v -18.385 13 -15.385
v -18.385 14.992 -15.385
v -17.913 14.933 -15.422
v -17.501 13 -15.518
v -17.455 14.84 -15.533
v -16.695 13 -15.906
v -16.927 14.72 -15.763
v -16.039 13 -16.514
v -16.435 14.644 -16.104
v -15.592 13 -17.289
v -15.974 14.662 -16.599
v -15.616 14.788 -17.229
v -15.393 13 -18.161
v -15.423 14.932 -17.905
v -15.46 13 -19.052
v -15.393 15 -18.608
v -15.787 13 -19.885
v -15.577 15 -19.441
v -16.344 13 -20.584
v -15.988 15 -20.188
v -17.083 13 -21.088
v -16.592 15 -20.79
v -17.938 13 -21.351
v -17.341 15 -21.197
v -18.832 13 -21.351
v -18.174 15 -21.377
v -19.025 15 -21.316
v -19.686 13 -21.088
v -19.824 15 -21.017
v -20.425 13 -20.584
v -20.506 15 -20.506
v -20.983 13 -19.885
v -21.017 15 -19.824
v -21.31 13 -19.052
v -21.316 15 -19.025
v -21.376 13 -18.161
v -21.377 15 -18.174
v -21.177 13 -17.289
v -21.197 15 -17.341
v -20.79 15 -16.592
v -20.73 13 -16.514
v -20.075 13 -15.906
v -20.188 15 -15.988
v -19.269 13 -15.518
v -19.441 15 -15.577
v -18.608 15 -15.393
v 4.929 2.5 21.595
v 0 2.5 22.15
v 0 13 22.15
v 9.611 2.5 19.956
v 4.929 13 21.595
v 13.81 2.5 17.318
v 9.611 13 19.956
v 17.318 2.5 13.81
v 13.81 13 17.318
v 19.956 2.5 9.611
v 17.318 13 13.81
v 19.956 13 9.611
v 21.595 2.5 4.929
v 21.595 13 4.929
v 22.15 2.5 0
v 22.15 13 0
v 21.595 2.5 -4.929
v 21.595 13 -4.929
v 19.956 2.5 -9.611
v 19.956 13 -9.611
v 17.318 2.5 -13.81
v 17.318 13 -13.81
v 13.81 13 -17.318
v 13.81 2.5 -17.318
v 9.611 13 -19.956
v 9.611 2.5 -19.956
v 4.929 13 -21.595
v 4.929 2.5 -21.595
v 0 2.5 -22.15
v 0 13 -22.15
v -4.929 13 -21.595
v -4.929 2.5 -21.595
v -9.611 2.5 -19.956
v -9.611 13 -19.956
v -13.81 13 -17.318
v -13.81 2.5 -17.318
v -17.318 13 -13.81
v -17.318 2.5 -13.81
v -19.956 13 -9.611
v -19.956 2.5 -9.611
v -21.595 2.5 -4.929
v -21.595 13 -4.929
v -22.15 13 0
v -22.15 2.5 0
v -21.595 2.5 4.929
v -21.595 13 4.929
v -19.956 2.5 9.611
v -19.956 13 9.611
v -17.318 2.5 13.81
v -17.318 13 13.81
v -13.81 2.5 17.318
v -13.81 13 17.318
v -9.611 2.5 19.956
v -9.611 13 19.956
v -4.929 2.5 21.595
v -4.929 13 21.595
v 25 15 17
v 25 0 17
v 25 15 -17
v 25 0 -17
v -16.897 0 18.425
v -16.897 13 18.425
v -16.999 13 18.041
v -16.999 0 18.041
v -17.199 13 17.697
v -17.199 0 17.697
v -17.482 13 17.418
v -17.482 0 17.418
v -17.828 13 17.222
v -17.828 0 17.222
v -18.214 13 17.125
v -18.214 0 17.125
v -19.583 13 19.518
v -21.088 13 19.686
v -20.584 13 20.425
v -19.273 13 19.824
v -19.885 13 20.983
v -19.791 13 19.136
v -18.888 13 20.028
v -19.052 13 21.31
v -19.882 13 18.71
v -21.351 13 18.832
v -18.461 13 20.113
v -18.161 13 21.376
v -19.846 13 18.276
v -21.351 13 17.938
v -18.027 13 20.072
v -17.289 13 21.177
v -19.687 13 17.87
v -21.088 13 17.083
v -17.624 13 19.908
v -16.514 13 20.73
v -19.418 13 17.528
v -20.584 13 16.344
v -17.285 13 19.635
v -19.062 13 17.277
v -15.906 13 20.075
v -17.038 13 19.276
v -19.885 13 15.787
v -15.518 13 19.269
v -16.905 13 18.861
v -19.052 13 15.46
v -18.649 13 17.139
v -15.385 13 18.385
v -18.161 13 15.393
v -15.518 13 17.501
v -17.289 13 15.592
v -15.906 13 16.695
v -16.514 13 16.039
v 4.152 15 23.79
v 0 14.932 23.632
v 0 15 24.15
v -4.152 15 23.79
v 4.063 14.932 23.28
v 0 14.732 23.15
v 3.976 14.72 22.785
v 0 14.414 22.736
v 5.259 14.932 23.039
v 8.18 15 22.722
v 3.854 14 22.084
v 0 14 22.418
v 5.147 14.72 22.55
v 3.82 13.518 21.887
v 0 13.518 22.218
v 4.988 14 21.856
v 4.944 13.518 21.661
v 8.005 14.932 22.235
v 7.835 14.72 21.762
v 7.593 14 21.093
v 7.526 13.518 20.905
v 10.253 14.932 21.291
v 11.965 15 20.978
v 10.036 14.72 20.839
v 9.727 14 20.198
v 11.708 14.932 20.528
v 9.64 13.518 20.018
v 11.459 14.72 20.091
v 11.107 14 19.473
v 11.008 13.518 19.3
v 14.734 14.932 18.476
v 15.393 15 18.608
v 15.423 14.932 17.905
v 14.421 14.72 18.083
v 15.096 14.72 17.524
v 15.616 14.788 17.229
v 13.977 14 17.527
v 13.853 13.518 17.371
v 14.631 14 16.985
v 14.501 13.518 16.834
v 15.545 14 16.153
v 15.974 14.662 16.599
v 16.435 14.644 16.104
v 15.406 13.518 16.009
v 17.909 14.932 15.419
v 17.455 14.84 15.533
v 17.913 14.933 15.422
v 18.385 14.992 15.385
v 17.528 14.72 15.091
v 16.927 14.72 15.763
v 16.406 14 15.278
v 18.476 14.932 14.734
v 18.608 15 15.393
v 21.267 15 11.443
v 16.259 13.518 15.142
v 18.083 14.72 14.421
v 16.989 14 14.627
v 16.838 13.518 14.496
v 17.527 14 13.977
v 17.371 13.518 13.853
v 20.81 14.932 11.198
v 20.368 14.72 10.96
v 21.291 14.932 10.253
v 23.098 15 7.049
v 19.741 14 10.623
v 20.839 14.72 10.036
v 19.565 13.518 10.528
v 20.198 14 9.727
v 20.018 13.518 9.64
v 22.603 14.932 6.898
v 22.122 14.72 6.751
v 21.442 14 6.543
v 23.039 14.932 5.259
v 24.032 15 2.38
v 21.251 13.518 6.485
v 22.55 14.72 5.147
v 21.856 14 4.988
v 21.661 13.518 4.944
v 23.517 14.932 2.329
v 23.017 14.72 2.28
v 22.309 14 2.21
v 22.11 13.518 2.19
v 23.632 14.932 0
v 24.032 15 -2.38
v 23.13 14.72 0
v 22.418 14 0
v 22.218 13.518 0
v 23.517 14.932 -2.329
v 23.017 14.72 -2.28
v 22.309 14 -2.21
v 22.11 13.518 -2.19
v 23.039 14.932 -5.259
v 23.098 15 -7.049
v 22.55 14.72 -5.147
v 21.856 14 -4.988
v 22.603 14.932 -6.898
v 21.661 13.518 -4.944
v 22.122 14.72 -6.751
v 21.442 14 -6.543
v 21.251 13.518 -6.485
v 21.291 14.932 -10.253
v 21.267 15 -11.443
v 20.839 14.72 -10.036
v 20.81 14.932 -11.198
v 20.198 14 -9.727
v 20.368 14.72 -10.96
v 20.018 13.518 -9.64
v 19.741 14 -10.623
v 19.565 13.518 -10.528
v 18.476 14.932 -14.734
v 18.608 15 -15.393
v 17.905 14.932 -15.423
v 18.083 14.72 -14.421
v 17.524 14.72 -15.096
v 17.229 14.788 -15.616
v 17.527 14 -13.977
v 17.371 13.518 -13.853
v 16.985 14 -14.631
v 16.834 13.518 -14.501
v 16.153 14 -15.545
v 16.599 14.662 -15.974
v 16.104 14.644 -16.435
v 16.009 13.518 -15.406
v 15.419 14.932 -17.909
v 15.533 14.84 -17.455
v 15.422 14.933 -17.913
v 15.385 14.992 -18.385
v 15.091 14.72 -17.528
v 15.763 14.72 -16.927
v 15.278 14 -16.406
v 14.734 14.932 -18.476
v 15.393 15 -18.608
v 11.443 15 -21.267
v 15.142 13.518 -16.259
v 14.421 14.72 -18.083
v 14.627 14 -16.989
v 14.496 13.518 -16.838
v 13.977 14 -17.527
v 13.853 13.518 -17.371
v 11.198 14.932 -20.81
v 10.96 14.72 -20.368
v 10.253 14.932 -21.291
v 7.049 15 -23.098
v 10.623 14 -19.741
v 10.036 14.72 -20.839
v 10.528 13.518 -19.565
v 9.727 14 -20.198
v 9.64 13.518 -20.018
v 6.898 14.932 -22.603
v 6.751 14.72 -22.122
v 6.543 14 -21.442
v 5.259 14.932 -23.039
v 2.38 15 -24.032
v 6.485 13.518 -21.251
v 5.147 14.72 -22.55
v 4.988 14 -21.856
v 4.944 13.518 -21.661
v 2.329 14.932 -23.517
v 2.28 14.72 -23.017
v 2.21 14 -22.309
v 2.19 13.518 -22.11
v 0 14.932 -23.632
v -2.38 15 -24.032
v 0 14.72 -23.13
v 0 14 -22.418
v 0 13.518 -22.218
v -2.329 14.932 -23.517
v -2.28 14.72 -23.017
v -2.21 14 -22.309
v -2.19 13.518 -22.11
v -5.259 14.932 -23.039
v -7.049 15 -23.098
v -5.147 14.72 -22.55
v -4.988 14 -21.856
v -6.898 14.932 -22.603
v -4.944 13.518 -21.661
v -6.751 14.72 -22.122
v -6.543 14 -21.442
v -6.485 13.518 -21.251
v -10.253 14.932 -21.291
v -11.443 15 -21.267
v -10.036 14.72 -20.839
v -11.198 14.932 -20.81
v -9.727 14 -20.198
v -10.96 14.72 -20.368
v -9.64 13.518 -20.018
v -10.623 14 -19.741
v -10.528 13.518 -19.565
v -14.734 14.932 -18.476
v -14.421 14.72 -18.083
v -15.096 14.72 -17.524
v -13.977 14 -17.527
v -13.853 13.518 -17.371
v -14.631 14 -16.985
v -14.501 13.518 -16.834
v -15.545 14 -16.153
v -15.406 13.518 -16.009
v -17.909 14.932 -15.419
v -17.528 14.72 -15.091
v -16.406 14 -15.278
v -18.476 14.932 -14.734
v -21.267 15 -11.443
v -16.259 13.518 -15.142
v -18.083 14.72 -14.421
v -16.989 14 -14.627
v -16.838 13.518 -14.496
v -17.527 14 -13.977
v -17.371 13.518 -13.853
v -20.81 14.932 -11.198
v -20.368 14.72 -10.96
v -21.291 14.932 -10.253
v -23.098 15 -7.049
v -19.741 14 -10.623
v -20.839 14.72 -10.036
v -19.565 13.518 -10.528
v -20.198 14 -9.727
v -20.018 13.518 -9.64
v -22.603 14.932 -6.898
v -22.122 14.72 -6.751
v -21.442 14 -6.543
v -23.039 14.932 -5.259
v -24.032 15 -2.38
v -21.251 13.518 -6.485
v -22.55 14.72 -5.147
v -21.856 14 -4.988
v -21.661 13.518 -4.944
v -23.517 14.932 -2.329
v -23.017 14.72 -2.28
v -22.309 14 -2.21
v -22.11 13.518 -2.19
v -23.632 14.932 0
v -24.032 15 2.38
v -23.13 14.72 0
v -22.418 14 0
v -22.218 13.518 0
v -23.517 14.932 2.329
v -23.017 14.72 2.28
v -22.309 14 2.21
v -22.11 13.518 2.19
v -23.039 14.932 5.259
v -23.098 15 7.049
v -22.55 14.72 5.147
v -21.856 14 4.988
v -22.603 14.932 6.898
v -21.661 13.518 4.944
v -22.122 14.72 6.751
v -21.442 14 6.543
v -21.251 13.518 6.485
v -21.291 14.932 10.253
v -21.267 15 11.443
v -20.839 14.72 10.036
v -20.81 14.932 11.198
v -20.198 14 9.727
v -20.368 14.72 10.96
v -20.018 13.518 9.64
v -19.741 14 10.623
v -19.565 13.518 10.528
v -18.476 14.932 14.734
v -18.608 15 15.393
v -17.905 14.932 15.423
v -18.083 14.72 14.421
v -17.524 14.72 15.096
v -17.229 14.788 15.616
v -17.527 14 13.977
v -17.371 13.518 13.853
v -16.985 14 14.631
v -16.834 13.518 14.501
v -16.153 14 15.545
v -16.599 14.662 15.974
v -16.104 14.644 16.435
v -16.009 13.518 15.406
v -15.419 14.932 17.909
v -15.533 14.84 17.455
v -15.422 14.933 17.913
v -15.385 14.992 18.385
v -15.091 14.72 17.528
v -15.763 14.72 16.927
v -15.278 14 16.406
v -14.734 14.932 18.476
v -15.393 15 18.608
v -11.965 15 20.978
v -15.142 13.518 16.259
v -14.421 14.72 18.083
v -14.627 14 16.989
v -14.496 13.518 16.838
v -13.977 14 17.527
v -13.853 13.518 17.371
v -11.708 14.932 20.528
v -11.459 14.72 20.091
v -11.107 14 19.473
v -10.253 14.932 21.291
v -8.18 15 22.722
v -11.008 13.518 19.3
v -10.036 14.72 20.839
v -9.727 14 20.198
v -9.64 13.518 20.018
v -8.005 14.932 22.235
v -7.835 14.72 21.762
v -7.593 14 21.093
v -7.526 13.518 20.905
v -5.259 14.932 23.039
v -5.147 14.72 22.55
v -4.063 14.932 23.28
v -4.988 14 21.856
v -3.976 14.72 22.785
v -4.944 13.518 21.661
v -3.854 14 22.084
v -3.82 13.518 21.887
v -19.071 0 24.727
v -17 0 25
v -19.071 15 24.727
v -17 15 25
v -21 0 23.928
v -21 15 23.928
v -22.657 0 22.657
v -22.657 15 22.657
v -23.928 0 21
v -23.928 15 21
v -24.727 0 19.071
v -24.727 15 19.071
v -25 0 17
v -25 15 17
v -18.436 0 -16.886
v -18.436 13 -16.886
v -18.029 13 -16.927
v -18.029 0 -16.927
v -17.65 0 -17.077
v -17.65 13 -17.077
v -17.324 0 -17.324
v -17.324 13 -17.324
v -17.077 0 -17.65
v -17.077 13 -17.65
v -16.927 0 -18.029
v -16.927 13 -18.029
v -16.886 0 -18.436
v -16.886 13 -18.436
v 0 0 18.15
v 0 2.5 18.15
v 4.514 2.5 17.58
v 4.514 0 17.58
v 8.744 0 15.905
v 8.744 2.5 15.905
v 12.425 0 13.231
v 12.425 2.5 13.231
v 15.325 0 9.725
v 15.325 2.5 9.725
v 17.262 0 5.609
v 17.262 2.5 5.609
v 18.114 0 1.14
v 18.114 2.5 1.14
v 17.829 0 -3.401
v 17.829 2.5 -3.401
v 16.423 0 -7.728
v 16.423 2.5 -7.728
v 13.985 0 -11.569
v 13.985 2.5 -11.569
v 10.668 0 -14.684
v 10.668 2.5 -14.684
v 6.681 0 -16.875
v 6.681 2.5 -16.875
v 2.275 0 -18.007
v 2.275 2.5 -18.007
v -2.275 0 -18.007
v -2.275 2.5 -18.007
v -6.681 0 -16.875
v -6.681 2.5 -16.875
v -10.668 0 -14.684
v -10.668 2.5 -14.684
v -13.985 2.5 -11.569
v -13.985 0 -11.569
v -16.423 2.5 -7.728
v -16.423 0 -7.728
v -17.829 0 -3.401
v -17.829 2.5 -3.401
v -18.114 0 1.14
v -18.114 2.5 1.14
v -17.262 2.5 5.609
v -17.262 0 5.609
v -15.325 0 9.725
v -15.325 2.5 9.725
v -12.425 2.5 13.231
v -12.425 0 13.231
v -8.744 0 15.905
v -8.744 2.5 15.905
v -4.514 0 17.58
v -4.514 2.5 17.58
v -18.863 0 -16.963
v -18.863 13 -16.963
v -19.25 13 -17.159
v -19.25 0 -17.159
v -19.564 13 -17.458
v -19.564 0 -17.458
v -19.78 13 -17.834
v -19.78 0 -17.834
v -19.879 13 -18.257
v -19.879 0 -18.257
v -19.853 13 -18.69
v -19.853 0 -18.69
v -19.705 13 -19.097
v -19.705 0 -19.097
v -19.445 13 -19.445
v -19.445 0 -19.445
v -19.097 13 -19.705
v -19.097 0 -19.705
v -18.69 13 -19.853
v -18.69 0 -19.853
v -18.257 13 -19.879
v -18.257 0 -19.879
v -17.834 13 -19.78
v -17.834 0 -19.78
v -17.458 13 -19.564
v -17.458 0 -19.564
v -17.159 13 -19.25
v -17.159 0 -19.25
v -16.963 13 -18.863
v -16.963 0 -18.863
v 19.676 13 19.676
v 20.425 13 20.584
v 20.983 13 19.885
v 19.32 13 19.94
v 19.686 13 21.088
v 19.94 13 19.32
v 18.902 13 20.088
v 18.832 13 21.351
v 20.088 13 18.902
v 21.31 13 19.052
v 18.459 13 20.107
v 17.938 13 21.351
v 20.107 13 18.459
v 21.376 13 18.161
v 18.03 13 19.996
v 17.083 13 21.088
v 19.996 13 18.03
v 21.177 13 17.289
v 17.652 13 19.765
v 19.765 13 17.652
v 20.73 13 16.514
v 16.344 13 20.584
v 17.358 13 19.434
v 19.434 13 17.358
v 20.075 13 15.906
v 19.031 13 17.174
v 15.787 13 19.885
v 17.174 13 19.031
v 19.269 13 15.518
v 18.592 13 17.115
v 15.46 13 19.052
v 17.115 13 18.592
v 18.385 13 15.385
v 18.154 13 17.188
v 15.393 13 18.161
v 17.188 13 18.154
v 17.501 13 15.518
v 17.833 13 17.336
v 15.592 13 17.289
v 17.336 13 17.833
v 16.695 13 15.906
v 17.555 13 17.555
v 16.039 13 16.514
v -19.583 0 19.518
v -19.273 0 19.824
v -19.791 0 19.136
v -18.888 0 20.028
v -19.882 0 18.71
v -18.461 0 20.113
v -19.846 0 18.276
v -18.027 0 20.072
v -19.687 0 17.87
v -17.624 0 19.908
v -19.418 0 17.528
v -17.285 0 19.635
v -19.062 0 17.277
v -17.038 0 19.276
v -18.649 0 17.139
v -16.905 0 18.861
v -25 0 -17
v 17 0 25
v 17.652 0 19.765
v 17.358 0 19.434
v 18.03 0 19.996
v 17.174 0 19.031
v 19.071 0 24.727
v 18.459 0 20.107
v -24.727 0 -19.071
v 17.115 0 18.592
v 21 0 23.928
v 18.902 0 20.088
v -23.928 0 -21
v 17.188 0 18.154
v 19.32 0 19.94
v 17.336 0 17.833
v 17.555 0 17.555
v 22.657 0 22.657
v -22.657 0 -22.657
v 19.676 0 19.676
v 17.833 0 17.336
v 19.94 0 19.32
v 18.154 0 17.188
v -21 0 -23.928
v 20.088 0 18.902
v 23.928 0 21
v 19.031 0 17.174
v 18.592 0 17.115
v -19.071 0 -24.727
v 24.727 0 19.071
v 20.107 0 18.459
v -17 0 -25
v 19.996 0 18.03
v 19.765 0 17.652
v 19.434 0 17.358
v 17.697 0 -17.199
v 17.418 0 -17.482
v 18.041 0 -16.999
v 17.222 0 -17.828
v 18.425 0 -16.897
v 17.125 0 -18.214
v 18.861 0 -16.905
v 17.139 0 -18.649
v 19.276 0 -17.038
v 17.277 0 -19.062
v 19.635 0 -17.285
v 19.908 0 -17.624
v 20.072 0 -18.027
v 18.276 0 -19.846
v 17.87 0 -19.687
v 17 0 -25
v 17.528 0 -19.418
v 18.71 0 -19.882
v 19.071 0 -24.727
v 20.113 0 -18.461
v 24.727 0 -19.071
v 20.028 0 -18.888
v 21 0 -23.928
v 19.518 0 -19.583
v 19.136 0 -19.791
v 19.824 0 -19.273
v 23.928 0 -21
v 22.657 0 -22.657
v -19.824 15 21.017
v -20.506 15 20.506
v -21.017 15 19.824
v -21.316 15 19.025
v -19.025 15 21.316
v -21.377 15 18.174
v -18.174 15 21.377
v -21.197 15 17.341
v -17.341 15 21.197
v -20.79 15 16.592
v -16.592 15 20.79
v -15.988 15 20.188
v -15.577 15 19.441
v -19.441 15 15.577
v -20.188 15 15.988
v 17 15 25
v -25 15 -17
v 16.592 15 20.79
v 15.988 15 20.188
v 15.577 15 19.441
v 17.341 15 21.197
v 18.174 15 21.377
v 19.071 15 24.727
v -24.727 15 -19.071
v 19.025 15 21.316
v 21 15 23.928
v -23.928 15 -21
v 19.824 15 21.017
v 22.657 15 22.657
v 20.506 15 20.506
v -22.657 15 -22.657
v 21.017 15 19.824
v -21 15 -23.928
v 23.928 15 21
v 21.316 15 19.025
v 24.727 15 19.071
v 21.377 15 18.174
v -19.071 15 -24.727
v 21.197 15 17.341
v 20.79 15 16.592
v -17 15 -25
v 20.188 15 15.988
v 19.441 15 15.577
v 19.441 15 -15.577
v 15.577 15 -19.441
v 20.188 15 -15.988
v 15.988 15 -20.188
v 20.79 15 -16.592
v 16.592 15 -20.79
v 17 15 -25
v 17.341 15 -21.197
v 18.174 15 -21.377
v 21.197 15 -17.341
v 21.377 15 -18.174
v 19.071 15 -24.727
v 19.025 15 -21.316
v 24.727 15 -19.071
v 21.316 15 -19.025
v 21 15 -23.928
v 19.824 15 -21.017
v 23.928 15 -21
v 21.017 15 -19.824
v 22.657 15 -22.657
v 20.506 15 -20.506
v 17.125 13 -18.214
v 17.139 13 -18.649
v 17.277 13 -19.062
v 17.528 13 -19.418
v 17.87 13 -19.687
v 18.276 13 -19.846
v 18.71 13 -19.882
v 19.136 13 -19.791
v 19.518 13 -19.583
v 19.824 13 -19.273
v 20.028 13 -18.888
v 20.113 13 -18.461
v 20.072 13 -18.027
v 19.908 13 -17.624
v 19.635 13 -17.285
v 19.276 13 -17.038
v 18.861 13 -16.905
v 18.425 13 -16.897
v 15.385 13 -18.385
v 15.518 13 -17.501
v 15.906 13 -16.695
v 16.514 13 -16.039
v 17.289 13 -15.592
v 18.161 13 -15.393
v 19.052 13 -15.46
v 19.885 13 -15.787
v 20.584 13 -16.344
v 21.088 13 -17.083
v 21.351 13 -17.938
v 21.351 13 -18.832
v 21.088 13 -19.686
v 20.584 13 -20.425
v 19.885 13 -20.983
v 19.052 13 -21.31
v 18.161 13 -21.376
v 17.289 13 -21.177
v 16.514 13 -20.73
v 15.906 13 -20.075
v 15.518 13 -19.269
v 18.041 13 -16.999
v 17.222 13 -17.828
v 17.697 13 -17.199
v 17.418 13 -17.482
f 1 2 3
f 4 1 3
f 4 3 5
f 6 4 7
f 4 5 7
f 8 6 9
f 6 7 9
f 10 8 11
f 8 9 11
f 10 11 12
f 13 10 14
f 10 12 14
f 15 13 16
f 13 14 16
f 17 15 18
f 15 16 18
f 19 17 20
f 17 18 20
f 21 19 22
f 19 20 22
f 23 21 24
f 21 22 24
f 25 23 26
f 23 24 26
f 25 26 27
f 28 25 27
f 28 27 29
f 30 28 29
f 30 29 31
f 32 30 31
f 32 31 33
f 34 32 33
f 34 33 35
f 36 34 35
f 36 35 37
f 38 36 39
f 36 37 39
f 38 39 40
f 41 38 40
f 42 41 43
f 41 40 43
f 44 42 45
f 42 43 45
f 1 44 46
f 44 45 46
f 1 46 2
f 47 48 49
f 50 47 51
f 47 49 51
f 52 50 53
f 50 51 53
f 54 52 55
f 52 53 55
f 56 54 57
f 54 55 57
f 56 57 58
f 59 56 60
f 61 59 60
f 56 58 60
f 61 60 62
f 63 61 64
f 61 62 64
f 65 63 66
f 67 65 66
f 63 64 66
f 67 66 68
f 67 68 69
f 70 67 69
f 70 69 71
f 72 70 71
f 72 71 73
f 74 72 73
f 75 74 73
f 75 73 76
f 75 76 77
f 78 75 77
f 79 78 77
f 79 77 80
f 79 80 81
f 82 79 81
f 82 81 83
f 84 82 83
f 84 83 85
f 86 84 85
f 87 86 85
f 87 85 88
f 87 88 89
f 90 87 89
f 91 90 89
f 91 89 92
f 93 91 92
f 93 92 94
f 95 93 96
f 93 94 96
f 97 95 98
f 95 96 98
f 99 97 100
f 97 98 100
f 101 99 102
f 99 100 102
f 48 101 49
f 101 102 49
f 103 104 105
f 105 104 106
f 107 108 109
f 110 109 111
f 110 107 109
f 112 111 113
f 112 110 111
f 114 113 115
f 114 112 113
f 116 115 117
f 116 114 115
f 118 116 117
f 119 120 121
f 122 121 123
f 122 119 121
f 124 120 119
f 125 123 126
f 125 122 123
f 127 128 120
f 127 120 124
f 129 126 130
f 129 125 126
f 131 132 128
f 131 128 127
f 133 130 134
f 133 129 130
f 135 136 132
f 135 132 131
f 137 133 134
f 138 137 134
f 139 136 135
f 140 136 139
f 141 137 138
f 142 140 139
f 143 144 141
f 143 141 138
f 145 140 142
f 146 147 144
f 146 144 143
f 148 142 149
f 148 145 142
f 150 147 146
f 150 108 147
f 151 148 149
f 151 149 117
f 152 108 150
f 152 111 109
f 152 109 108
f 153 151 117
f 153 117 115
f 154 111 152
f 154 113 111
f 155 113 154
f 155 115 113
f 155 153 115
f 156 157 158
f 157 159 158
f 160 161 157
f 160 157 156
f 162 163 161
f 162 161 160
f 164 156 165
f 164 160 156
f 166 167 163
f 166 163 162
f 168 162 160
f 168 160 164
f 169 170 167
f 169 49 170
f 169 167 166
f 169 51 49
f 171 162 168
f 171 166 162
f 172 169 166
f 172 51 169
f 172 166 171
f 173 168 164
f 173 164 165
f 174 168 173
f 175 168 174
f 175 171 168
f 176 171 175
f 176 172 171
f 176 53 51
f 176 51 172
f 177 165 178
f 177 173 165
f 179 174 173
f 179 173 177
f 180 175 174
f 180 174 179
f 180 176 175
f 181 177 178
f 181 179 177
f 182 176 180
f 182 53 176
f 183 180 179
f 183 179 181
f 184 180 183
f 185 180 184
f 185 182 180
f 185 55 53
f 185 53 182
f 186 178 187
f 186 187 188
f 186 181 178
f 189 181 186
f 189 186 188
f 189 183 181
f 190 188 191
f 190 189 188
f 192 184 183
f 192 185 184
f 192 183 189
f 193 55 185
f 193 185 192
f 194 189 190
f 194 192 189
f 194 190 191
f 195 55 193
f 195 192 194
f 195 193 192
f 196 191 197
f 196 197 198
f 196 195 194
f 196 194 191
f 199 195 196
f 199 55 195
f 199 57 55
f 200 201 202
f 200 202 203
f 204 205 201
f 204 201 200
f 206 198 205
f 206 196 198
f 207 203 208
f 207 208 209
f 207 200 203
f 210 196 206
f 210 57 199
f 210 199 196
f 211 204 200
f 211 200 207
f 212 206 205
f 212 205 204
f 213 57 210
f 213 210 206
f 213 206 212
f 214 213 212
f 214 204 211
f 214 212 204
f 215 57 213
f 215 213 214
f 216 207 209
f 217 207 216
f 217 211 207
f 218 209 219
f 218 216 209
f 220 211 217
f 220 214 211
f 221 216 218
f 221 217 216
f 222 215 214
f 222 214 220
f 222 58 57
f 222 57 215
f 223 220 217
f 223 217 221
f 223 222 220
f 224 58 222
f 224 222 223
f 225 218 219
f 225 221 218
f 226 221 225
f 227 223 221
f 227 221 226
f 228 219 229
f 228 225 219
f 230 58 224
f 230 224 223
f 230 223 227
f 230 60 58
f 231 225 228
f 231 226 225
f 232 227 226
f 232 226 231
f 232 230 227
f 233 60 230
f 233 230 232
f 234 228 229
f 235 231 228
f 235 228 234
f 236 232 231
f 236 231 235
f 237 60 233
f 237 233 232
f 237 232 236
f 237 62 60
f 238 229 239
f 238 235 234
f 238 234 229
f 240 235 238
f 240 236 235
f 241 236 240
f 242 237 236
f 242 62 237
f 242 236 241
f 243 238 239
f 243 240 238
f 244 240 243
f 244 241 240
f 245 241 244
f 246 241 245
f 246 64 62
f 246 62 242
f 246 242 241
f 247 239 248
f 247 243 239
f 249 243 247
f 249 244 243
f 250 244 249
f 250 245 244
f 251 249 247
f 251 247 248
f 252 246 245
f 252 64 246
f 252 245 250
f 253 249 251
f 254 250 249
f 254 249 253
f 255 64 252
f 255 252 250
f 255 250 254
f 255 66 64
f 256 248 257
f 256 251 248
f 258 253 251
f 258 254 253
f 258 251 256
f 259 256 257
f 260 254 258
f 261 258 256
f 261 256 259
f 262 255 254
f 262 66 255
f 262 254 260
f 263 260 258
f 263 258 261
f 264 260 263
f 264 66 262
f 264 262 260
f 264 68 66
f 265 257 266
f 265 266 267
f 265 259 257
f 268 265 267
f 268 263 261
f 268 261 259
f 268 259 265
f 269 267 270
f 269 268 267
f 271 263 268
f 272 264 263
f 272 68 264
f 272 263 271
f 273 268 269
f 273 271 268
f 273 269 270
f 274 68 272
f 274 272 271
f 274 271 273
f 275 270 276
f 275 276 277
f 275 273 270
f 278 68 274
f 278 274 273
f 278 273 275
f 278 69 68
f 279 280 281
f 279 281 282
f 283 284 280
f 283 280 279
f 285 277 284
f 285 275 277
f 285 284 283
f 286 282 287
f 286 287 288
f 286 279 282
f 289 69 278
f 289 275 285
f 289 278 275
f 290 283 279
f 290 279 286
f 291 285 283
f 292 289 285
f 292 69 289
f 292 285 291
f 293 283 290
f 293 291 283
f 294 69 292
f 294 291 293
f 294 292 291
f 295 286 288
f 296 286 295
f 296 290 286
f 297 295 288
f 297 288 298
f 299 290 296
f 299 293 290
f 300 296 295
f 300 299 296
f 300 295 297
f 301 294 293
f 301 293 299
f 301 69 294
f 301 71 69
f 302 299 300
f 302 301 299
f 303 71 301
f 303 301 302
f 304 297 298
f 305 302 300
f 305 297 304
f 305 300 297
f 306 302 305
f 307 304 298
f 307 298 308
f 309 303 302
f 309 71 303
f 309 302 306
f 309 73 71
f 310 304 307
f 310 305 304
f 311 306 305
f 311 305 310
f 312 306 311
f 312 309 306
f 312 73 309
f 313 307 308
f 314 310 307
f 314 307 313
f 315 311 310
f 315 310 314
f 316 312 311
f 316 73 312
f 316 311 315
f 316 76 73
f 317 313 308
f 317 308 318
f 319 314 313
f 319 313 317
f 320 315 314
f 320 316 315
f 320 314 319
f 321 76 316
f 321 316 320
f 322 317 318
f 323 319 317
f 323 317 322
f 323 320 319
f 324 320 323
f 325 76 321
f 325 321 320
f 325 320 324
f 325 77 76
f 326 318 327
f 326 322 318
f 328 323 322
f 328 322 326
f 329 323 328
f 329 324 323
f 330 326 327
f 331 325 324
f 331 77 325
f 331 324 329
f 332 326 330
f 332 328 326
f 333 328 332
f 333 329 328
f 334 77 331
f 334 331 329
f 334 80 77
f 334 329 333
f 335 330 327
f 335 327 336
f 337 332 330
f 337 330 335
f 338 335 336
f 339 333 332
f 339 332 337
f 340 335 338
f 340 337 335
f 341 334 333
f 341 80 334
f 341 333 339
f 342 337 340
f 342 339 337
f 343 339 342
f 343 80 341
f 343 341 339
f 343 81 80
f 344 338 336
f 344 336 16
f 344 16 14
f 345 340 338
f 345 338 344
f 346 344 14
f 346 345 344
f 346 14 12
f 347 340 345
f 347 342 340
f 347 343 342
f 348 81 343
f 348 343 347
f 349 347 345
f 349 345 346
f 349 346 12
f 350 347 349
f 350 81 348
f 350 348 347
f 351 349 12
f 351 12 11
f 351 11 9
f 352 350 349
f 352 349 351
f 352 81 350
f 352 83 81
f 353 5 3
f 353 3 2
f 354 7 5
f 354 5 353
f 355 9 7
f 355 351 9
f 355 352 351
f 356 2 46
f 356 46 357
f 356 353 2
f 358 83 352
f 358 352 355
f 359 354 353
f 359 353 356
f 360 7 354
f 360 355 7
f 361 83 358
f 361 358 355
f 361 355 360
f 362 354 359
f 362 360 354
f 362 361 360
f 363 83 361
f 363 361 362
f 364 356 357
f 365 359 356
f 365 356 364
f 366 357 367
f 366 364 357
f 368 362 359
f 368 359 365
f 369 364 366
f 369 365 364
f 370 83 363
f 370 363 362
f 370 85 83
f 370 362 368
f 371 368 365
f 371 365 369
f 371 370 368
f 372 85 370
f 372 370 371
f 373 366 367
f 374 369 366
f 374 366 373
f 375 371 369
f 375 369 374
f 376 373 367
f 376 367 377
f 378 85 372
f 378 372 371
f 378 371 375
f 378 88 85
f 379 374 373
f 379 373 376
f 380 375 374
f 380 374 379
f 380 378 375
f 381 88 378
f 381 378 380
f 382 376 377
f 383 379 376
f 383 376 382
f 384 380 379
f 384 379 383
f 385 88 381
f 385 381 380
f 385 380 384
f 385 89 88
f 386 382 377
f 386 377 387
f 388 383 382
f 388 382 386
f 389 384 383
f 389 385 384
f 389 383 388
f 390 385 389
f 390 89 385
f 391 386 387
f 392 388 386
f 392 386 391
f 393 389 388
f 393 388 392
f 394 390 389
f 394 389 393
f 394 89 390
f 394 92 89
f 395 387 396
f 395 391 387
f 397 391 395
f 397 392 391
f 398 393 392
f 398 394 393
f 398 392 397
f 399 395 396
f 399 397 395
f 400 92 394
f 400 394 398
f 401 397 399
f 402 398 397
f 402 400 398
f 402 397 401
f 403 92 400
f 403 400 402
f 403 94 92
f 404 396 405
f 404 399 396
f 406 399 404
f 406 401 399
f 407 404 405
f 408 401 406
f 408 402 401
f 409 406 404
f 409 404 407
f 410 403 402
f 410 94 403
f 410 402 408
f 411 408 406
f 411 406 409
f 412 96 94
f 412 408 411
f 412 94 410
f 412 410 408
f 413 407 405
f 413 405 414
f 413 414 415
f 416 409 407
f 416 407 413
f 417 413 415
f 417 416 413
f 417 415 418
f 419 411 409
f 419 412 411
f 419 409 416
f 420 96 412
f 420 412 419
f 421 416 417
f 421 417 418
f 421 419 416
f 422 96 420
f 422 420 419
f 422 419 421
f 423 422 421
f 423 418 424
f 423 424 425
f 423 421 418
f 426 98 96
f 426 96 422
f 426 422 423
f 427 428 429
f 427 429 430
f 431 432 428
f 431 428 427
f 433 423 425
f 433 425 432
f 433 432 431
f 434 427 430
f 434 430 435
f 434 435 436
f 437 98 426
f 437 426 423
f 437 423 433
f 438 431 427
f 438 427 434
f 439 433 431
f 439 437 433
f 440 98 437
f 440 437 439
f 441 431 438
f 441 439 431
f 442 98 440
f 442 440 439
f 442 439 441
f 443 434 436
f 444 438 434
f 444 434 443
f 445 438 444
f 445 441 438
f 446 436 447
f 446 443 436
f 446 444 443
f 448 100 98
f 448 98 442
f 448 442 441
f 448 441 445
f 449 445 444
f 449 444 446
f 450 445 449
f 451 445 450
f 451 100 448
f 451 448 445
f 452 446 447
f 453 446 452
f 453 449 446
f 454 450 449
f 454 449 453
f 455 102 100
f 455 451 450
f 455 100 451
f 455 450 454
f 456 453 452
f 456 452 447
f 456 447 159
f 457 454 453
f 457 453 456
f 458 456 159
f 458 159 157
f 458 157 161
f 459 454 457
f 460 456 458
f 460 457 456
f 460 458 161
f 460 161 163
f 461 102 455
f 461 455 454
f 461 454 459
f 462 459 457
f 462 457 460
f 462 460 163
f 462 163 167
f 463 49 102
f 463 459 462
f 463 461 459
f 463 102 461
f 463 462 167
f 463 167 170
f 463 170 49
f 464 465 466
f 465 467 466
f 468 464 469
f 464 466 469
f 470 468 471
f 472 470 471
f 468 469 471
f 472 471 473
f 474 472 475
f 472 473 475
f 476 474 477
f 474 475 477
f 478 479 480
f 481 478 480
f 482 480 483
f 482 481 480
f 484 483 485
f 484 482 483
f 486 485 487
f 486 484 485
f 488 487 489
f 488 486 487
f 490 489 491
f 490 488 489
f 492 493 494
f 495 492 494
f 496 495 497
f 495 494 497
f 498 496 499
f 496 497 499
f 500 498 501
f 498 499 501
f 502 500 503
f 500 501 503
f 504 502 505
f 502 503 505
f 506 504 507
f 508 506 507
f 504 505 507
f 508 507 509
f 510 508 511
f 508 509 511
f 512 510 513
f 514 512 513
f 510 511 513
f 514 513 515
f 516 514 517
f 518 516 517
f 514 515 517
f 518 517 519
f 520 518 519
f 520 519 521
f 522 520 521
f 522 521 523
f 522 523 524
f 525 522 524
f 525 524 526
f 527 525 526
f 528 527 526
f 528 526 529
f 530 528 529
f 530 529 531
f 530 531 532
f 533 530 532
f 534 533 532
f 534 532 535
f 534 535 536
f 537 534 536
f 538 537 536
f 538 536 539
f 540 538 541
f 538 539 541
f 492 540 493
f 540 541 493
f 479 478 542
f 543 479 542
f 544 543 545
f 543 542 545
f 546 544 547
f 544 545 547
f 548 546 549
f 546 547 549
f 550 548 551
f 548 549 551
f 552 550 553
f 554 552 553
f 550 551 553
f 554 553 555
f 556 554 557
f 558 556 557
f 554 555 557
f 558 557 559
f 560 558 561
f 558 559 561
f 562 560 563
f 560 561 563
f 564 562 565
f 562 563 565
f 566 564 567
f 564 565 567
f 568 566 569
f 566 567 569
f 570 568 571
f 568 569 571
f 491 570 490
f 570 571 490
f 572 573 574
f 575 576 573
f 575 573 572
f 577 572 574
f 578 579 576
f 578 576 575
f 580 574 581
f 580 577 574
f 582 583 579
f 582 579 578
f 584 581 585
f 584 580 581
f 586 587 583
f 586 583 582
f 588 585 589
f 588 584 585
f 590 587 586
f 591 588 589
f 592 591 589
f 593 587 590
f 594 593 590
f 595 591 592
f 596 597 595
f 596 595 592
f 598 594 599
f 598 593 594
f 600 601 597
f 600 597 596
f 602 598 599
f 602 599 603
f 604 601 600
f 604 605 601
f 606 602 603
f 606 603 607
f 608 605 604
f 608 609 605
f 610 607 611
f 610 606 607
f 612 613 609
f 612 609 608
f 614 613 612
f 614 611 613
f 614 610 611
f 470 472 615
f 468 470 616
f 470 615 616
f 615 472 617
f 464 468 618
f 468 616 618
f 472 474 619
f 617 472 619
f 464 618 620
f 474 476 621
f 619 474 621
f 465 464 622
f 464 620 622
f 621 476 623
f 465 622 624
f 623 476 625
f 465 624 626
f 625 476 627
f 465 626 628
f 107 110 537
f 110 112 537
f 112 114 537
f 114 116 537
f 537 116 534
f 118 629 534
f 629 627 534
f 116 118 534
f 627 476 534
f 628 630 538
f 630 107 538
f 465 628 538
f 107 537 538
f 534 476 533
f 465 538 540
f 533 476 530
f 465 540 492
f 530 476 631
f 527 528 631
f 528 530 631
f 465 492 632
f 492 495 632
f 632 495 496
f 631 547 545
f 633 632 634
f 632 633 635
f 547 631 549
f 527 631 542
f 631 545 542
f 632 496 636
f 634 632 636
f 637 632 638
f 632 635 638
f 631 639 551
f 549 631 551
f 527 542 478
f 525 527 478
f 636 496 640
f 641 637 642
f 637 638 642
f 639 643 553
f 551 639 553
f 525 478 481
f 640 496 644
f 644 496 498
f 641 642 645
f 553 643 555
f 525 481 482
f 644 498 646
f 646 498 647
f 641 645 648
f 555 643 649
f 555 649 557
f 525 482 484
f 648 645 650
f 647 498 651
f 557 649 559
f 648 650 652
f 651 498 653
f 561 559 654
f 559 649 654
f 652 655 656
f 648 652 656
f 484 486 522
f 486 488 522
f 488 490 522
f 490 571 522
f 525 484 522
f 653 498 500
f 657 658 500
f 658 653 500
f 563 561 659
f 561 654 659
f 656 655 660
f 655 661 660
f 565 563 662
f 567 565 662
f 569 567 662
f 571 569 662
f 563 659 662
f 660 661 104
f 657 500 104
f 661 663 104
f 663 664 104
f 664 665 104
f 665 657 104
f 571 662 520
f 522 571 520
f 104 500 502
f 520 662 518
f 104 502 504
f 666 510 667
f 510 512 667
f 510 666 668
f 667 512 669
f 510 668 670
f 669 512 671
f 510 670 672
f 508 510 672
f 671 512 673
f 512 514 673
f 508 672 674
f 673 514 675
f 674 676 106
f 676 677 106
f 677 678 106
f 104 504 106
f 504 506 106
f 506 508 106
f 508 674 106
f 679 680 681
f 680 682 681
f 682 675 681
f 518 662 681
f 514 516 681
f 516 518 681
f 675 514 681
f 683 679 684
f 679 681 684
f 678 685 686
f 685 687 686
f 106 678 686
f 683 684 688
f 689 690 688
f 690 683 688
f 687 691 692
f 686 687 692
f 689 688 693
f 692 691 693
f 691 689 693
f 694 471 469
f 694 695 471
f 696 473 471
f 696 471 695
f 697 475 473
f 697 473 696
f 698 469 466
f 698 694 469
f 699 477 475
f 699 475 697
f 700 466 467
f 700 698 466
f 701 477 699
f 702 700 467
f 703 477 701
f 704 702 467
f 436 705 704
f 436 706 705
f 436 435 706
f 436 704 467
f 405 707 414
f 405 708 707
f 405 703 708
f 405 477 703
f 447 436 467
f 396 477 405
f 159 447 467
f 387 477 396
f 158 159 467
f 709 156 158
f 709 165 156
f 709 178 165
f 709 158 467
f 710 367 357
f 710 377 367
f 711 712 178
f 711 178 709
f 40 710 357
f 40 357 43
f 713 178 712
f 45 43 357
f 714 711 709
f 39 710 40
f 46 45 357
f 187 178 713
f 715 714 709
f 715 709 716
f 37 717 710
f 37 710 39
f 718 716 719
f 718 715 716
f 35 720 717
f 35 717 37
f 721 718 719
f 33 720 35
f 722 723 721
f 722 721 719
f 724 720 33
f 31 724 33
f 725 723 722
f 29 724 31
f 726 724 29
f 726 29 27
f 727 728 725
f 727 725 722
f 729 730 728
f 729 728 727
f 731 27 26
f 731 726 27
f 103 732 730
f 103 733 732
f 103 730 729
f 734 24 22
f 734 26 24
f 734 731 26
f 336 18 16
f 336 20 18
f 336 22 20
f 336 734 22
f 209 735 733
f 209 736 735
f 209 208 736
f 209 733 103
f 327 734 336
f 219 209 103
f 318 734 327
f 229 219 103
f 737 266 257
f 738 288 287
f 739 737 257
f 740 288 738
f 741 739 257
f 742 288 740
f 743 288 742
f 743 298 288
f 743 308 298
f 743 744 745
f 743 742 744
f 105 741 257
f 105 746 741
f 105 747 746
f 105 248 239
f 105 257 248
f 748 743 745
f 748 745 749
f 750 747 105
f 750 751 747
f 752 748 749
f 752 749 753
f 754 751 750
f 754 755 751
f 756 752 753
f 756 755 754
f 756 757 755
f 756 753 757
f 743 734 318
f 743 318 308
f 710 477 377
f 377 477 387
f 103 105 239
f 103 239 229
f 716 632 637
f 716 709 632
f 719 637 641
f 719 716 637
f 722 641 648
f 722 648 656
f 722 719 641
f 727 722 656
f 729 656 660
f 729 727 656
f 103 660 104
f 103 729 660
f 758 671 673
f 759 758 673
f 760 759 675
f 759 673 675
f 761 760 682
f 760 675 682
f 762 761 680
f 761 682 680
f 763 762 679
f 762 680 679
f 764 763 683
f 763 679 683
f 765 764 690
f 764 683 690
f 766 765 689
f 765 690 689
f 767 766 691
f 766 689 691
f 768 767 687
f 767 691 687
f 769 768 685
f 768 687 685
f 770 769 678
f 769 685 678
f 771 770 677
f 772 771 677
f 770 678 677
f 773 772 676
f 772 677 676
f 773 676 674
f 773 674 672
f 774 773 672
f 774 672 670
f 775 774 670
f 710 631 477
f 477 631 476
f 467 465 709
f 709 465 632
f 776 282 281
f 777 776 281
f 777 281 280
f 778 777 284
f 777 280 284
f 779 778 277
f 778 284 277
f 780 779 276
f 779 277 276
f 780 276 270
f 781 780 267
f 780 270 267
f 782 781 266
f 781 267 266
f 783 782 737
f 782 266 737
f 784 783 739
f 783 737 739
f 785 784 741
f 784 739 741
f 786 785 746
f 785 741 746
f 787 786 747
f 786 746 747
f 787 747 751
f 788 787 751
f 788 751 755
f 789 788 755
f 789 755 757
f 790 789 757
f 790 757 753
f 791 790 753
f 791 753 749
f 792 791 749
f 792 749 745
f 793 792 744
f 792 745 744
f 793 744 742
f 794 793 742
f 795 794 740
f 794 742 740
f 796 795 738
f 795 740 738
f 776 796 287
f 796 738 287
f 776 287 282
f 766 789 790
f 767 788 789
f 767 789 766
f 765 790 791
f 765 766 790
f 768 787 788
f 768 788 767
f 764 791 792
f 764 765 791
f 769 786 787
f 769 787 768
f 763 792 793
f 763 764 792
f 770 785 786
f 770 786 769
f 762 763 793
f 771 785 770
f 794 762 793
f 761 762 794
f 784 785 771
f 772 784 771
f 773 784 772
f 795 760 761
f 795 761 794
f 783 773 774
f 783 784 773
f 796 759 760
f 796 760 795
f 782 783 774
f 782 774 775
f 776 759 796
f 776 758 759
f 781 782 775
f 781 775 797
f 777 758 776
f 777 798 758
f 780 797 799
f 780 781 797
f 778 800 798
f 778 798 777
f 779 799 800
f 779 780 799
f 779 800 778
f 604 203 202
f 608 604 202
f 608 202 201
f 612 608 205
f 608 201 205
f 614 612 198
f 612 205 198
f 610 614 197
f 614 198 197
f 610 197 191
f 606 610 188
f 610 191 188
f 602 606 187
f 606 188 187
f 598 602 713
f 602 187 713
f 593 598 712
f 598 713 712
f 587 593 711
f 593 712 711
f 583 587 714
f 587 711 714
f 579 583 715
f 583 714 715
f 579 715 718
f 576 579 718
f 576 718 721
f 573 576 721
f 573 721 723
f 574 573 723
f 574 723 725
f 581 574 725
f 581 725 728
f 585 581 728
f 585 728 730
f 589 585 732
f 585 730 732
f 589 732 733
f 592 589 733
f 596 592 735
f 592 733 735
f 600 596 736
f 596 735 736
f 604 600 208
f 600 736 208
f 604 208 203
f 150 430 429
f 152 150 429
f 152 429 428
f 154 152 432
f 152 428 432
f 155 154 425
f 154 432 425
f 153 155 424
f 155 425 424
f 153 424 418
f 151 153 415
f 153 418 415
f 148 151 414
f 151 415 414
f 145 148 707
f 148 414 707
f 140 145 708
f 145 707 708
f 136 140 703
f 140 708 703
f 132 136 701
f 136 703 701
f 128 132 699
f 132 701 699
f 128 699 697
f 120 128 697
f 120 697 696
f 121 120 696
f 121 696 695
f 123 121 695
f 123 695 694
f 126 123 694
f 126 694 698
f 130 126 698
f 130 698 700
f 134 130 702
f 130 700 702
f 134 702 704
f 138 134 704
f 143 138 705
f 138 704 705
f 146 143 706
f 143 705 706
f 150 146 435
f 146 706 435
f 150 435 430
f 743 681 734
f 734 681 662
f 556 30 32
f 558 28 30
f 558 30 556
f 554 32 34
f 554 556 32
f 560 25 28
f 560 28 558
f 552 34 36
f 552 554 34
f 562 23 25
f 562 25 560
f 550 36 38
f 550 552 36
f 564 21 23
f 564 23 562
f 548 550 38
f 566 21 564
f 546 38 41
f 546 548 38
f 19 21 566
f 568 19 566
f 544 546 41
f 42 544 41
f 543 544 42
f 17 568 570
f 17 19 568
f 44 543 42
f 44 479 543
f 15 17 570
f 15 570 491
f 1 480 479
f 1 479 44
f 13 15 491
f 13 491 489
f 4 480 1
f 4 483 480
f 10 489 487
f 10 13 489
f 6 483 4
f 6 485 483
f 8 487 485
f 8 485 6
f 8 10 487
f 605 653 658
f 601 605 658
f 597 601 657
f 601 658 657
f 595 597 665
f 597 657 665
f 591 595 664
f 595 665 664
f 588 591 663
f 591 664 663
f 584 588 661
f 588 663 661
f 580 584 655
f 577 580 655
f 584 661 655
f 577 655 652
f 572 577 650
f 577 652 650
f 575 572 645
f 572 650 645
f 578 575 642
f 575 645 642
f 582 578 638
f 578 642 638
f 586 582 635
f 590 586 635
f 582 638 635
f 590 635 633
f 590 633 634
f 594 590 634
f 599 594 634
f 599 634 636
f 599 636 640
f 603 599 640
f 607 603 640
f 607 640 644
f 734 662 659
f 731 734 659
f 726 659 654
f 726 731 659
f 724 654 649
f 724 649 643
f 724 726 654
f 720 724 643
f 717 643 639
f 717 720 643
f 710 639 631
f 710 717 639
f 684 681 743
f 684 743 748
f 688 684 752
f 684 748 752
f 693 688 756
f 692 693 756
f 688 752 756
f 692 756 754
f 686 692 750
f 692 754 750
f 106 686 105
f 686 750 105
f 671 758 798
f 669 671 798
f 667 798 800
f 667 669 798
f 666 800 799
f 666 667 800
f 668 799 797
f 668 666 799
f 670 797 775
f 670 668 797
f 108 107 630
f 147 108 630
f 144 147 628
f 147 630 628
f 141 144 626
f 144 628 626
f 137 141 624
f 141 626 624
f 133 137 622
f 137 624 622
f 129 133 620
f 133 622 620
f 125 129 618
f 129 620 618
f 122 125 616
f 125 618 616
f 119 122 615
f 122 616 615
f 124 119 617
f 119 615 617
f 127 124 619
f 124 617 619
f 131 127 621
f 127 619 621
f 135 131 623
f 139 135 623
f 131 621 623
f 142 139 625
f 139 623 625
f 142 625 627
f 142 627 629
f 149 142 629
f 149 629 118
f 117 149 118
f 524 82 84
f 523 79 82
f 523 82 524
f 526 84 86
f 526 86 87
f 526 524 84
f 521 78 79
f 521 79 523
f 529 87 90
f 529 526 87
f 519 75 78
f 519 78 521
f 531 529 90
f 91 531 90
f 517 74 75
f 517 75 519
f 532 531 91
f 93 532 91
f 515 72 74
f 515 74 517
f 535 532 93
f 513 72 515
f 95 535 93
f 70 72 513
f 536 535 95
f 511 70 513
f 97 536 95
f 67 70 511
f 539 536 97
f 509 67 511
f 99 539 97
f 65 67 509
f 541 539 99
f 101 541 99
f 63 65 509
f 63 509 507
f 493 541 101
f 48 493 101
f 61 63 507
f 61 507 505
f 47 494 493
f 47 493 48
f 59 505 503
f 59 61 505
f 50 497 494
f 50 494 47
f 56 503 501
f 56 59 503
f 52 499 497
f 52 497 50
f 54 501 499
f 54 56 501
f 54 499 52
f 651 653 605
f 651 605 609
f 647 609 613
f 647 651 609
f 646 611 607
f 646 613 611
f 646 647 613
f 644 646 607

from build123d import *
from build123d.topology import SkipClean

# Parameters (mm, degrees)
SKETCH_1_R               = 25
EXTRUDE_1_DEPTH          = 15
SKETCH_2_R               = 22.15
CUT_EXTRUDE_1_DEPTH      = 12.5
SKETCH_3_R               = 18.15
CUT_EXTRUDE_2_DEPTH      = 12.5
EXTRUDE_2_DEPTH          = 15
FILLET_1_R               = 8
CUT_EXTRUDE_START        = -15
SKETCH_5_R               = 1.5
CUT_EXTRUDE_3_DEPTH      = 15
SKETCH_6_R               = 3
CUT_EXTRUDE_4_DEPTH      = 2
PATTERN_CIRCULAR_1_COUNT = 4
FILLET_2_R               = 2


with BuildPart() as part:
    # 草图1 → 凸台-拉伸1 (new body)
    with BuildSketch(Plane(origin=(0, 0, 0), x_dir=(1, 0, 0), z_dir=(0, 1, 0))):
        with Locations(Location((0, 0, 0), (0, 0, 270))):
            Circle(SKETCH_1_R)
    extrude(amount=EXTRUDE_1_DEPTH)

    # 草图2 → 切除-拉伸1 (cut)
    with BuildSketch(Plane(origin=(0, 15, 0), x_dir=(1, 0, 0), z_dir=(0, 1, 0))):
        with Locations(Location((0, 0, 0), (0, 0, 270))):
            Circle(SKETCH_2_R)
    extrude(amount=-CUT_EXTRUDE_1_DEPTH, mode=Mode.SUBTRACT)

    # 草图3 → 切除-拉伸2 (cut)
    with BuildSketch(Plane(origin=(0, 2.5, 0), x_dir=(1, 0, 0), z_dir=(0, 1, 0))):
        with Locations(Location((0, 0, 0), (0, 0, 270))):
            Circle(SKETCH_3_R)
    extrude(amount=-CUT_EXTRUDE_2_DEPTH, mode=Mode.SUBTRACT)

    # 草图4 → 凸台-拉伸2 (add)
    with BuildSketch(Plane(origin=(0, 0, 0), x_dir=(1, 0, 0), z_dir=(0, 1, 0))):
        with BuildLine():
            Line((0, 25), (-25, 25))
            Line((-25, 25), (-25, 2.6e-08))
            ThreePointArc((-25, 2.6e-08), (-23.301207713, 9.058350794), (-18.435702489, 16.885641052))
            ThreePointArc((-18.435702489, 16.885641052), (-19.445436483, 19.445436483), (-16.885641052, 18.435702489))
            ThreePointArc((-16.885641052, 18.435702489), (-9.058350782, 23.301207718), (0, 25))
        make_face()
        with BuildLine():
            Line((25, 25), (0, 25))
            ThreePointArc((0, 25), (9.210354363, 23.241544108), (17.125028574, 18.213549801))
            ThreePointArc((17.125028574, 18.213549801), (19.682469279, 19.438809921), (18.425448396, 16.896829626))
            ThreePointArc((18.425448396, 16.896829626), (23.298457137, 9.065423048), (25, 0))
            Line((25, 0), (25, 25))
        make_face()
        with BuildLine():
            ThreePointArc((-18.213549801, -17.125028574), (-23.241544113, -9.210354351), (-25, 2.6e-08))
            Line((-25, 2.6e-08), (-25, -25))
            Line((-25, -25), (-5.8e-08, -25))
            ThreePointArc((-5.8e-08, -25), (-9.065423076, -23.298457126), (-16.896829626, -18.425448396))
            ThreePointArc((-16.896829626, -18.425448396), (-19.438809921, -19.682469279), (-18.213549801, -17.125028574))
        make_face()
        with BuildLine():
            Line((25, -25), (25, 0))
            ThreePointArc((25, 0), (23.22561674, -9.250444694), (18.154341838, -17.18778265))
            ThreePointArc((18.154341838, -17.18778265), (19.675883861, -19.675883861), (17.18778265, -18.154341838))
            ThreePointArc((17.18778265, -18.154341838), (9.250444666, -23.225616751), (-5.8e-08, -25))
            Line((-5.8e-08, -25), (25, -25))
        make_face()
    extrude(amount=EXTRUDE_2_DEPTH)

    # 圆角1
    fillet_1_edges = [part.edges().sort_by_distance(p)[0] for p in [
        (-25, 7.5, -25),
        (25, 7.5, -25),
        (-25, 7.5, 25),
        (25, 7.5, 25),
    ]]
    fillet(fillet_1_edges, radius=FILLET_1_R)

    # 草图5 → 切除-拉伸3 (cut)
    with BuildSketch(Plane(origin=(0, 15, 0), x_dir=(1, 0, 0), z_dir=(0, 1, 0)).offset(CUT_EXTRUDE_START)):
        with Locations(Location((-18.384776311, 18.384776311, 0), (0, 0, 270))):
            Circle(SKETCH_5_R)
        with Locations(Location((18.615223689, 18.384776311, 0), (0, 0, 270))):
            Circle(SKETCH_5_R)
        with Locations(Location((18.615223689, -18.615223689, 0), (0, 0, 270))):
            Circle(SKETCH_5_R)
        with Locations(Location((-18.384776311, -18.615223689, 0), (0, 0, 270))):
            Circle(SKETCH_5_R)
    extrude(amount=CUT_EXTRUDE_3_DEPTH, mode=Mode.SUBTRACT)

    # 草图6 → 切除-拉伸4 (cut)
    with BuildSketch(Plane(origin=(0, 15, 0), x_dir=(1, 0, 0), z_dir=(0, 1, 0))):
        with Locations(Location((-18.384776311, 18.384776311, 0), (0, 0, 270))):
            Circle(SKETCH_6_R)
    cut_extrude_4 = extrude(amount=-CUT_EXTRUDE_4_DEPTH, mode=Mode.SUBTRACT)

    # 阵列(圆周)1: 切除-拉伸4 ×4 about axis
    with SkipClean():  # the faces are left unmerged after this step: merging them gives an invalid solid
        pattern_circular_1_axis = Axis((0, 0, 0), (0, 1, 0))
        for i in range(1, PATTERN_CIRCULAR_1_COUNT):
            add(cut_extrude_4.rotate(pattern_circular_1_axis, i * 360 / PATTERN_CIRCULAR_1_COUNT), mode=Mode.SUBTRACT)

    # 圆角2
    # the kernel refuses this fillet: 2 mm, written as the material it takes off along each edge
    with BuildSketch(Plane(origin=(0, 15, 0), x_dir=(0, 0, 1), z_dir=(-1, 0, 0))) as fillet_2_piece_1:
        with BuildLine():
            CenterArc((22.15 + FILLET_2_R, -FILLET_2_R), FILLET_2_R, 90, 90)
            Line((22.15, -FILLET_2_R), (22.15, 0))
            Line((22.15, 0), (22.15 + FILLET_2_R, 0))
        make_face()
    revolve(axis=Axis((0, 15, 0), (0, 1, 0)), mode=Mode.SUBTRACT)


solid = part.part
